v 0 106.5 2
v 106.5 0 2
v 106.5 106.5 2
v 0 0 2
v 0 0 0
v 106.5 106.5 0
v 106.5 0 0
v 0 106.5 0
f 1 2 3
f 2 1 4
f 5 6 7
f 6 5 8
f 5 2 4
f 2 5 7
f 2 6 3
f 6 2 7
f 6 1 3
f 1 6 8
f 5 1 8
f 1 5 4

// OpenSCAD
//
// With this script you can generate a icing tip box
// and lid for a custom number of tips. The lid can either be a simple lid, 
// or aa logo lid. A logo lid will require some work within your slicer to add the 
// logo, but the box and the lid base can be generated from this script.
//
// To customize the size, change the number of rows or columns to meet you needs
//
// If you want a logo lid set the inset_logo_lid to true, otherwise leave it false
//
// When you are ready, set the make_box variable to true to make the box then 
// set it to false to make the lid.
//
/////////////////
//  Making a Logo/Name Lid
/////////////////
// I have use Cura, so the instructions for a logo lid below are for that software.
// 
// 1) Get a logo in jpg format. If you don't have one you could make a lid
//    with someone's name either by using a graphics editing program or by writing
//    their name in a word processor and using screen capture software like the 
//    Windows snipping tool to cut it out. 
// 2) After opening Cure, make sure you can stack object in Cura by turning off the
//    Automatic drop model to the build plate setting which can be found by going to 
//    Preference -> Configure Cura then unchecking the option in the General section.
// 3) Open the blank lid you generated
// 4) In the same project, open your logo and make sure the size will fit on the lid 
//    by setting the Width and depth walues correctly, you can check the size of the
//    lid blank by clicking on it then selecting resize. Once the size is correct set
//    The height of the logo to 8 and base to 0.
// 5) Select the logo and move it into place by clicking the move icon and setting
//    x=0,y=0,z=2
// 6) If you want it multi-color, then prior to exporting the gcode, enable pausing 
//    from the menu by clicking Extensions -> Post Processing -> Modify G-code. Click 
//    the Add a script drop down and select Pause at height. The Pause height should 
//    be 2.3 and set the Standby Temperature to 185 to make removing the old filament
//    easier. 
//  
// You should be nore ready to eport you G-code.
////////////////////////////////////////////////
// Values you can change to customize the box //
////////////////////////////////////////////////
// Change the rows and columns values for your box
rows=4;
columns=4;

inset_logo_lid=true; // Set to true for a logo inset lid, otherwise it is just a 
                      // standard inset lid
logo_height=8; // This value can be changed based on your need. I use an 8mm logo
               // with a 2mm base so the logo can be used as a handle to remove the 
               // lid.

make_box=false; // Change to false to make the lid or logo lid base
                     

///////////////////////////////
// End Values you can change //
///////////////////////////////
lid_height=2;
box_width=rows*22 + 26;
box_length=columns*22 + 26;
// if using a logo lid add space for logo
box_height=(inset_logo_lid)?48:40;
rim_height=(inset_logo_lid)?box_height-lid_height-logo_height:box_height-lid_height;
    
wall_width=3;

//////////
// Main
//////////
if (make_box) {
    Box(box_width,box_height,wall_width,rim_height);

    for (row=[1:rows]) {
      for (column=[1:rows]) {
        TipHolder(2+ 22*row,2+ 22*column,3);
      }
  }
} else {
    // generate lid
    Lid(box_width,box_length,lid_height,inset_logo_lid);
}

//////////////
// End Main
//////////////


/////////////
// modules
/////////////
module Box(bw,bh,ww,rh) {
   difference() {
     translate([0, 0, 0])
       cube([bw,bw, bh], center = false);
    
    translate([2*ww,2*ww,ww])
      cube([bw-4*ww,bw-4*ww, bh], center = false);

    translate([ww,ww,rh])
      cube([bw-2*ww,bw-2*ww, bh], center = false);
}   
    
}
module TipHolder(x=0,y=0,z=0) {
   cone_base=14;
   cone_height=cone_base*1.95;

   difference () {
     translate([x,y,z])
       cylinder(h=cone_height, r1=cone_base/2, r2=0);
    
     translate([x-7,y-7,cone_height*.7+z])
       cube([cone_base,cone_base,cone_height*.3]);
   }
   translate([x,y,cone_height*.7+z])
     sphere(r=((cone_base/2)*(cone_height * .3)/cone_height),$fn=20); 
    
}

module Lid(bw,bl,lh,inset_logo_lid) {
    difference() {
      translate([0, 0, 0])
        cube([bw-7.5,bl-7.5, lh], center = false); 
      if (!inset_logo_lid) {
        translate([(bw-7.5)/2, (bl-7.5)/2-15, 0])
          cylinder(r = 10, h=4, center = true);           
        
        translate([(bw-7.5)/2, (bl-7.5)/2 + 15, 0])
          cylinder(r = 10, h=4, center = true);           
        }
    }
}
